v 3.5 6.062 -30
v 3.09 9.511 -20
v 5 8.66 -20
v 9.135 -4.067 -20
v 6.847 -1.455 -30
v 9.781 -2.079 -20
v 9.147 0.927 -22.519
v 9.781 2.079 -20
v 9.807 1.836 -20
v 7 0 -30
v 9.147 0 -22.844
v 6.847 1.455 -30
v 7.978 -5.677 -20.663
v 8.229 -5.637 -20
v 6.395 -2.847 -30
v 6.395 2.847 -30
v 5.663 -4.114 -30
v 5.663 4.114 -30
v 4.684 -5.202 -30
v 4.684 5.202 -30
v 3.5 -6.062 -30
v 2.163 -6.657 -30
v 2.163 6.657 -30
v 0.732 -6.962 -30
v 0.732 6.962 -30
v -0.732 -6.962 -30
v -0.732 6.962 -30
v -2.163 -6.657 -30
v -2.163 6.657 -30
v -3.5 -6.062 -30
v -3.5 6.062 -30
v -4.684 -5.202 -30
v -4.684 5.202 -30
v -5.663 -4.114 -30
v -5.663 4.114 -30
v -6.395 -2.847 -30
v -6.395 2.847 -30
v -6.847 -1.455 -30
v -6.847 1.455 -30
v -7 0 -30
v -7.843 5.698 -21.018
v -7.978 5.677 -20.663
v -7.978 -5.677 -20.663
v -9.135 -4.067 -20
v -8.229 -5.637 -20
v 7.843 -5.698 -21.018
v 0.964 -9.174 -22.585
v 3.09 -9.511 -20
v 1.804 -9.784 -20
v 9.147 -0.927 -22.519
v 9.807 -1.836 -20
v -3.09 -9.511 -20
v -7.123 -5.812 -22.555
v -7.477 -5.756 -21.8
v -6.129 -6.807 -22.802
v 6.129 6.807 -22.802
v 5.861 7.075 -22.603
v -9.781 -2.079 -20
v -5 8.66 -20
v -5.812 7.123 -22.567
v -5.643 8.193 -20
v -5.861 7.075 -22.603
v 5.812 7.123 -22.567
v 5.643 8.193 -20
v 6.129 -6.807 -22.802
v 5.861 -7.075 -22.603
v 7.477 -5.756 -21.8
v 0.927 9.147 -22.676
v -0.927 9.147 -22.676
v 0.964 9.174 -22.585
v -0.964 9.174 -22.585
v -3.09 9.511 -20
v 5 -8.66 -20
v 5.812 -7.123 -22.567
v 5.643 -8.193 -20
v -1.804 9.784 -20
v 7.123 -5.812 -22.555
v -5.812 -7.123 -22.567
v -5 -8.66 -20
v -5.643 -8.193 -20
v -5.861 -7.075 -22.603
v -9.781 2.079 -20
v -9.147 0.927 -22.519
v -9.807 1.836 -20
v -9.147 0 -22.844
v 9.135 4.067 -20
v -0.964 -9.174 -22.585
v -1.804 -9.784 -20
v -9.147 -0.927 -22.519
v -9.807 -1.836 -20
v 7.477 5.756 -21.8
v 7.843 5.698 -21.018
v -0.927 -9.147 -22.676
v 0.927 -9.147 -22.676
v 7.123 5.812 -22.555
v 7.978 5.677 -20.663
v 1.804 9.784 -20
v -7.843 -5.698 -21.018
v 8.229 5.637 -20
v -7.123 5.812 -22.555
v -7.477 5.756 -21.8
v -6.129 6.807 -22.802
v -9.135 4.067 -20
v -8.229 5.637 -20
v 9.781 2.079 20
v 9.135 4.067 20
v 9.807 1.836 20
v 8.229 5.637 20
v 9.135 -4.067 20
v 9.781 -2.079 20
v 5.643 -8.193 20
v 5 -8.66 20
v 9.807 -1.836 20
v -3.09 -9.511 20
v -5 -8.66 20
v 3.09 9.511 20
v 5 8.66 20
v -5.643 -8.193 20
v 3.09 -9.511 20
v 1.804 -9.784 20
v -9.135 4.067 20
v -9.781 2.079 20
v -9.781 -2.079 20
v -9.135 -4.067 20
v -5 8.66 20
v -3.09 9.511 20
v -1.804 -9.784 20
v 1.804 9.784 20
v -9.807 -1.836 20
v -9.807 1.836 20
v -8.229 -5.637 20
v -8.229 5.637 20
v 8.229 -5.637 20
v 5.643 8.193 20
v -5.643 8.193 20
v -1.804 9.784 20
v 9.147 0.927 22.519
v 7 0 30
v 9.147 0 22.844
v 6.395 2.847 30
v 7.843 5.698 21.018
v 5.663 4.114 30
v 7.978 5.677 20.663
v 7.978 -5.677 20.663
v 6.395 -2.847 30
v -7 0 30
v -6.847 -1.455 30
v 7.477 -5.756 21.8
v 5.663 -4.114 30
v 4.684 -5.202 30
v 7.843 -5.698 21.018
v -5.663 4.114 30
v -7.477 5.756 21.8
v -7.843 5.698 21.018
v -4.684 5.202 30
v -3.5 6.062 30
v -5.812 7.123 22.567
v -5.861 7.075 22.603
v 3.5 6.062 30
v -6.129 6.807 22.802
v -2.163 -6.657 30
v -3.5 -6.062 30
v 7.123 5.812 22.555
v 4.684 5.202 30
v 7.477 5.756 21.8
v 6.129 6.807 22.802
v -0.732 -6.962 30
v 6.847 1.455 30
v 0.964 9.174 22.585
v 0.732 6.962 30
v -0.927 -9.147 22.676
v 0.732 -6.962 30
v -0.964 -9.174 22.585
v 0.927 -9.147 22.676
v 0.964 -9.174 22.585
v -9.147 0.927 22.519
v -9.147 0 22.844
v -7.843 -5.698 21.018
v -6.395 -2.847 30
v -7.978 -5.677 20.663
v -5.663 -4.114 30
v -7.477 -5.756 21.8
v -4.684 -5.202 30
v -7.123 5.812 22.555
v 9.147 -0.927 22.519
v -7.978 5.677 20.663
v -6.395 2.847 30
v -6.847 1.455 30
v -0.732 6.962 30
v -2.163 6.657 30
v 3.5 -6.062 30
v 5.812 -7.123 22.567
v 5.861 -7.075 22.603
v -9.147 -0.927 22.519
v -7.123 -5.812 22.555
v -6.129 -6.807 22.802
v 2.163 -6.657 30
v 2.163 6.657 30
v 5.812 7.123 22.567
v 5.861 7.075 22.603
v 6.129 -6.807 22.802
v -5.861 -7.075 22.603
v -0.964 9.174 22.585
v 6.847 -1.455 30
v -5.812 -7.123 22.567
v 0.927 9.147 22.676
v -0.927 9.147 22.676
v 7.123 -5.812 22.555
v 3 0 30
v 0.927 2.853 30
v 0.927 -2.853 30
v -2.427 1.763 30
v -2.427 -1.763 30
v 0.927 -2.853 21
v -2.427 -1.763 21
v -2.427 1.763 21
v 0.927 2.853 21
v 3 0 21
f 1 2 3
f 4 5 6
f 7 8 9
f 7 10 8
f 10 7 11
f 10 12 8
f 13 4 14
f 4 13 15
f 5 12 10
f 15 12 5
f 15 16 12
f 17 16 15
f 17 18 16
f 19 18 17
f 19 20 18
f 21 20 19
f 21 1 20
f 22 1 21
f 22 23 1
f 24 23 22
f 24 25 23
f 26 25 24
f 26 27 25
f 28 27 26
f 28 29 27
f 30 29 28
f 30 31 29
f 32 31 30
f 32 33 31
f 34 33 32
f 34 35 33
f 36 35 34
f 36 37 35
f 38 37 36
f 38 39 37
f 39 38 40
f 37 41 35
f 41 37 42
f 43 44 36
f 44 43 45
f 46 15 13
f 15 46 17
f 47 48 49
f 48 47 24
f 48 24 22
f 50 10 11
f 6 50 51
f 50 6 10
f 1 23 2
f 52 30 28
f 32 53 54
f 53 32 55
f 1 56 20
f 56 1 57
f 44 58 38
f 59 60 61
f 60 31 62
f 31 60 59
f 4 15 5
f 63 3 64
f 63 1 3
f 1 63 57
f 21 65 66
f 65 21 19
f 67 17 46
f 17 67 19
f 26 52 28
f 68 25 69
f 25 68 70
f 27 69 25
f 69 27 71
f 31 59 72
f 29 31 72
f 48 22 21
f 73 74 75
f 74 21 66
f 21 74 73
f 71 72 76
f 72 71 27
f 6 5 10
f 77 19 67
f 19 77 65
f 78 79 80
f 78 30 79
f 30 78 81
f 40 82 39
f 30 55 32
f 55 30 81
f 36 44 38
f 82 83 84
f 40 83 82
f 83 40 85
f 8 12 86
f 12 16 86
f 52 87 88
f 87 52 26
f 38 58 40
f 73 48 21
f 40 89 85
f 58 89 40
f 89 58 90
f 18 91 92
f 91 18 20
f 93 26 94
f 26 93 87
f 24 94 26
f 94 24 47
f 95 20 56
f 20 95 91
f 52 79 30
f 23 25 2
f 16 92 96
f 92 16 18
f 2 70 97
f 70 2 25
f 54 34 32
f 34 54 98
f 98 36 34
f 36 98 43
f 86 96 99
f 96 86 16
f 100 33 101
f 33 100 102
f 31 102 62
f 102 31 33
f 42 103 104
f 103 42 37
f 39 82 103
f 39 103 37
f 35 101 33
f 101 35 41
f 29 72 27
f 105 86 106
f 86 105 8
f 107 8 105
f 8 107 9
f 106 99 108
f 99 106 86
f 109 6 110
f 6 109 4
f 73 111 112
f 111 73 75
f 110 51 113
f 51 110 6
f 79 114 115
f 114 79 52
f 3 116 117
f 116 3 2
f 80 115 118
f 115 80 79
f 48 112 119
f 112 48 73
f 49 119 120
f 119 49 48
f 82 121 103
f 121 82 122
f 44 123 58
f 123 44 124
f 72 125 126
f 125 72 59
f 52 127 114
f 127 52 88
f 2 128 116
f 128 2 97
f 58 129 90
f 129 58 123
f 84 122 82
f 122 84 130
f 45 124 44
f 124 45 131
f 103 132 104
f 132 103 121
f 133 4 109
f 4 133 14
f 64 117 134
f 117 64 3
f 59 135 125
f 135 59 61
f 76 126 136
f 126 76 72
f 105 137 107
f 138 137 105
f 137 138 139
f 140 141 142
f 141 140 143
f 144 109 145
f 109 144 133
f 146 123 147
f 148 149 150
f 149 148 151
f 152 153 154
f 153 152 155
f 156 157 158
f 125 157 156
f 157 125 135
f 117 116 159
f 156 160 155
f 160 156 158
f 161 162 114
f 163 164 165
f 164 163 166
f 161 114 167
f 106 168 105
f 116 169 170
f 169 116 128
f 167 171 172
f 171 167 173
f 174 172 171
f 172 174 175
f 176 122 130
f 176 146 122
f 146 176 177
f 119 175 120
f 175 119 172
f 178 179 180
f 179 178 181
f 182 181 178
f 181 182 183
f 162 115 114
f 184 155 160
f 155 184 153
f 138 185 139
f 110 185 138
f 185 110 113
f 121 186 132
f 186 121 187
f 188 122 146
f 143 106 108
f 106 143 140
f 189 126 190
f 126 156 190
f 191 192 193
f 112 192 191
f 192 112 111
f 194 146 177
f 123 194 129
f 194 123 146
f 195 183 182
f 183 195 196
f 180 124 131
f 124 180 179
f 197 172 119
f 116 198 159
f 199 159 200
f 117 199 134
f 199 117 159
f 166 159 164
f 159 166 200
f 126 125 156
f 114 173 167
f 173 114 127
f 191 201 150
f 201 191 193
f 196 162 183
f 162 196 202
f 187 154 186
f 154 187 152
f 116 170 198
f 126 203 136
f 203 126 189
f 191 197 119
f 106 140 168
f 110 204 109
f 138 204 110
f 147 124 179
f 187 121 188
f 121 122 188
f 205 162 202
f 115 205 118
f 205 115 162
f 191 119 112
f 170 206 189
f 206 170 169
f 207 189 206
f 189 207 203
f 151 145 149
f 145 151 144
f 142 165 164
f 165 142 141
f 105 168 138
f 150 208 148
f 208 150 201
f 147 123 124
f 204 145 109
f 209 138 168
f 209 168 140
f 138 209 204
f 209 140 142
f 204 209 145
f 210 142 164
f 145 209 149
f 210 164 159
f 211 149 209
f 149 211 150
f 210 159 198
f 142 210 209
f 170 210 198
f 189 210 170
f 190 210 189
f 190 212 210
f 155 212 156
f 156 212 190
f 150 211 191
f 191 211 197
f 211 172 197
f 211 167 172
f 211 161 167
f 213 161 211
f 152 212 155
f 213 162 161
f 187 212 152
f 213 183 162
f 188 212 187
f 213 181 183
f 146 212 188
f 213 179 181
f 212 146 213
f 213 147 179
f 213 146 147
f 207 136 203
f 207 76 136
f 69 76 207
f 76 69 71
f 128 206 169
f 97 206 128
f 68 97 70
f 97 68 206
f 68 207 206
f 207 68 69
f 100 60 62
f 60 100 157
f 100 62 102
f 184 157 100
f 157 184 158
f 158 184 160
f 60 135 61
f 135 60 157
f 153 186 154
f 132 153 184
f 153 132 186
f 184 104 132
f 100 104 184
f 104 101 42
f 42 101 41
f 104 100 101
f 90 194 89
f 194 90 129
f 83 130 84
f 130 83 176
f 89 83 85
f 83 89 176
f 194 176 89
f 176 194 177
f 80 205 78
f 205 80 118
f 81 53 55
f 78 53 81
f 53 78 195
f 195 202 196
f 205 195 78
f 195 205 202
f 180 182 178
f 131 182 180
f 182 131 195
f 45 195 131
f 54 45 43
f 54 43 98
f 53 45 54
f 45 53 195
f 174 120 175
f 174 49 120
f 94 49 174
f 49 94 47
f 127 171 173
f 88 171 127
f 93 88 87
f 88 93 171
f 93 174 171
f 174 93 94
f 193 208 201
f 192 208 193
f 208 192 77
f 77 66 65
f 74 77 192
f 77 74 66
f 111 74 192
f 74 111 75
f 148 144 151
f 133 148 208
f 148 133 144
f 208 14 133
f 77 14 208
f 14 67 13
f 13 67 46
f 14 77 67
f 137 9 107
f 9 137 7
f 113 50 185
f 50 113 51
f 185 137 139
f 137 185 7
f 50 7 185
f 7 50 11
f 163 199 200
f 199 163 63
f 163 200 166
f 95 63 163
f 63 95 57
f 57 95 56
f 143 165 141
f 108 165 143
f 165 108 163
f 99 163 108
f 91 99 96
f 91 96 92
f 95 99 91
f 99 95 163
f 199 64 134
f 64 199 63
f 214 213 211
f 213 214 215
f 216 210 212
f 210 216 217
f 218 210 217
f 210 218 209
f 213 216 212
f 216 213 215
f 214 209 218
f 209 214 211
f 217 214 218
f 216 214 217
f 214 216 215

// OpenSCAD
translate([0,0,-30])
difference() {
  mango();
  grip(n=8,r=3);
  hole(r=3);
}

module hole(r=3) {
  translate([0,0,51]) cylinder(h=10,r=r,$fn=5);
}

module grip(n=8,r=3) {
  for (i = [0:(360/n):360])
      rotate([0,0,i])
        translate([0,12,0])
          cylinder(h=200,r=r,center=true);
}

module mango() {
  cylinder(h=10,r1=7,r2=10);
  translate([0,0,10]) cylinder(h=40,r=10);
  translate([0,0,40+10]) cylinder(h=10,r1=10,r2=7);
}
